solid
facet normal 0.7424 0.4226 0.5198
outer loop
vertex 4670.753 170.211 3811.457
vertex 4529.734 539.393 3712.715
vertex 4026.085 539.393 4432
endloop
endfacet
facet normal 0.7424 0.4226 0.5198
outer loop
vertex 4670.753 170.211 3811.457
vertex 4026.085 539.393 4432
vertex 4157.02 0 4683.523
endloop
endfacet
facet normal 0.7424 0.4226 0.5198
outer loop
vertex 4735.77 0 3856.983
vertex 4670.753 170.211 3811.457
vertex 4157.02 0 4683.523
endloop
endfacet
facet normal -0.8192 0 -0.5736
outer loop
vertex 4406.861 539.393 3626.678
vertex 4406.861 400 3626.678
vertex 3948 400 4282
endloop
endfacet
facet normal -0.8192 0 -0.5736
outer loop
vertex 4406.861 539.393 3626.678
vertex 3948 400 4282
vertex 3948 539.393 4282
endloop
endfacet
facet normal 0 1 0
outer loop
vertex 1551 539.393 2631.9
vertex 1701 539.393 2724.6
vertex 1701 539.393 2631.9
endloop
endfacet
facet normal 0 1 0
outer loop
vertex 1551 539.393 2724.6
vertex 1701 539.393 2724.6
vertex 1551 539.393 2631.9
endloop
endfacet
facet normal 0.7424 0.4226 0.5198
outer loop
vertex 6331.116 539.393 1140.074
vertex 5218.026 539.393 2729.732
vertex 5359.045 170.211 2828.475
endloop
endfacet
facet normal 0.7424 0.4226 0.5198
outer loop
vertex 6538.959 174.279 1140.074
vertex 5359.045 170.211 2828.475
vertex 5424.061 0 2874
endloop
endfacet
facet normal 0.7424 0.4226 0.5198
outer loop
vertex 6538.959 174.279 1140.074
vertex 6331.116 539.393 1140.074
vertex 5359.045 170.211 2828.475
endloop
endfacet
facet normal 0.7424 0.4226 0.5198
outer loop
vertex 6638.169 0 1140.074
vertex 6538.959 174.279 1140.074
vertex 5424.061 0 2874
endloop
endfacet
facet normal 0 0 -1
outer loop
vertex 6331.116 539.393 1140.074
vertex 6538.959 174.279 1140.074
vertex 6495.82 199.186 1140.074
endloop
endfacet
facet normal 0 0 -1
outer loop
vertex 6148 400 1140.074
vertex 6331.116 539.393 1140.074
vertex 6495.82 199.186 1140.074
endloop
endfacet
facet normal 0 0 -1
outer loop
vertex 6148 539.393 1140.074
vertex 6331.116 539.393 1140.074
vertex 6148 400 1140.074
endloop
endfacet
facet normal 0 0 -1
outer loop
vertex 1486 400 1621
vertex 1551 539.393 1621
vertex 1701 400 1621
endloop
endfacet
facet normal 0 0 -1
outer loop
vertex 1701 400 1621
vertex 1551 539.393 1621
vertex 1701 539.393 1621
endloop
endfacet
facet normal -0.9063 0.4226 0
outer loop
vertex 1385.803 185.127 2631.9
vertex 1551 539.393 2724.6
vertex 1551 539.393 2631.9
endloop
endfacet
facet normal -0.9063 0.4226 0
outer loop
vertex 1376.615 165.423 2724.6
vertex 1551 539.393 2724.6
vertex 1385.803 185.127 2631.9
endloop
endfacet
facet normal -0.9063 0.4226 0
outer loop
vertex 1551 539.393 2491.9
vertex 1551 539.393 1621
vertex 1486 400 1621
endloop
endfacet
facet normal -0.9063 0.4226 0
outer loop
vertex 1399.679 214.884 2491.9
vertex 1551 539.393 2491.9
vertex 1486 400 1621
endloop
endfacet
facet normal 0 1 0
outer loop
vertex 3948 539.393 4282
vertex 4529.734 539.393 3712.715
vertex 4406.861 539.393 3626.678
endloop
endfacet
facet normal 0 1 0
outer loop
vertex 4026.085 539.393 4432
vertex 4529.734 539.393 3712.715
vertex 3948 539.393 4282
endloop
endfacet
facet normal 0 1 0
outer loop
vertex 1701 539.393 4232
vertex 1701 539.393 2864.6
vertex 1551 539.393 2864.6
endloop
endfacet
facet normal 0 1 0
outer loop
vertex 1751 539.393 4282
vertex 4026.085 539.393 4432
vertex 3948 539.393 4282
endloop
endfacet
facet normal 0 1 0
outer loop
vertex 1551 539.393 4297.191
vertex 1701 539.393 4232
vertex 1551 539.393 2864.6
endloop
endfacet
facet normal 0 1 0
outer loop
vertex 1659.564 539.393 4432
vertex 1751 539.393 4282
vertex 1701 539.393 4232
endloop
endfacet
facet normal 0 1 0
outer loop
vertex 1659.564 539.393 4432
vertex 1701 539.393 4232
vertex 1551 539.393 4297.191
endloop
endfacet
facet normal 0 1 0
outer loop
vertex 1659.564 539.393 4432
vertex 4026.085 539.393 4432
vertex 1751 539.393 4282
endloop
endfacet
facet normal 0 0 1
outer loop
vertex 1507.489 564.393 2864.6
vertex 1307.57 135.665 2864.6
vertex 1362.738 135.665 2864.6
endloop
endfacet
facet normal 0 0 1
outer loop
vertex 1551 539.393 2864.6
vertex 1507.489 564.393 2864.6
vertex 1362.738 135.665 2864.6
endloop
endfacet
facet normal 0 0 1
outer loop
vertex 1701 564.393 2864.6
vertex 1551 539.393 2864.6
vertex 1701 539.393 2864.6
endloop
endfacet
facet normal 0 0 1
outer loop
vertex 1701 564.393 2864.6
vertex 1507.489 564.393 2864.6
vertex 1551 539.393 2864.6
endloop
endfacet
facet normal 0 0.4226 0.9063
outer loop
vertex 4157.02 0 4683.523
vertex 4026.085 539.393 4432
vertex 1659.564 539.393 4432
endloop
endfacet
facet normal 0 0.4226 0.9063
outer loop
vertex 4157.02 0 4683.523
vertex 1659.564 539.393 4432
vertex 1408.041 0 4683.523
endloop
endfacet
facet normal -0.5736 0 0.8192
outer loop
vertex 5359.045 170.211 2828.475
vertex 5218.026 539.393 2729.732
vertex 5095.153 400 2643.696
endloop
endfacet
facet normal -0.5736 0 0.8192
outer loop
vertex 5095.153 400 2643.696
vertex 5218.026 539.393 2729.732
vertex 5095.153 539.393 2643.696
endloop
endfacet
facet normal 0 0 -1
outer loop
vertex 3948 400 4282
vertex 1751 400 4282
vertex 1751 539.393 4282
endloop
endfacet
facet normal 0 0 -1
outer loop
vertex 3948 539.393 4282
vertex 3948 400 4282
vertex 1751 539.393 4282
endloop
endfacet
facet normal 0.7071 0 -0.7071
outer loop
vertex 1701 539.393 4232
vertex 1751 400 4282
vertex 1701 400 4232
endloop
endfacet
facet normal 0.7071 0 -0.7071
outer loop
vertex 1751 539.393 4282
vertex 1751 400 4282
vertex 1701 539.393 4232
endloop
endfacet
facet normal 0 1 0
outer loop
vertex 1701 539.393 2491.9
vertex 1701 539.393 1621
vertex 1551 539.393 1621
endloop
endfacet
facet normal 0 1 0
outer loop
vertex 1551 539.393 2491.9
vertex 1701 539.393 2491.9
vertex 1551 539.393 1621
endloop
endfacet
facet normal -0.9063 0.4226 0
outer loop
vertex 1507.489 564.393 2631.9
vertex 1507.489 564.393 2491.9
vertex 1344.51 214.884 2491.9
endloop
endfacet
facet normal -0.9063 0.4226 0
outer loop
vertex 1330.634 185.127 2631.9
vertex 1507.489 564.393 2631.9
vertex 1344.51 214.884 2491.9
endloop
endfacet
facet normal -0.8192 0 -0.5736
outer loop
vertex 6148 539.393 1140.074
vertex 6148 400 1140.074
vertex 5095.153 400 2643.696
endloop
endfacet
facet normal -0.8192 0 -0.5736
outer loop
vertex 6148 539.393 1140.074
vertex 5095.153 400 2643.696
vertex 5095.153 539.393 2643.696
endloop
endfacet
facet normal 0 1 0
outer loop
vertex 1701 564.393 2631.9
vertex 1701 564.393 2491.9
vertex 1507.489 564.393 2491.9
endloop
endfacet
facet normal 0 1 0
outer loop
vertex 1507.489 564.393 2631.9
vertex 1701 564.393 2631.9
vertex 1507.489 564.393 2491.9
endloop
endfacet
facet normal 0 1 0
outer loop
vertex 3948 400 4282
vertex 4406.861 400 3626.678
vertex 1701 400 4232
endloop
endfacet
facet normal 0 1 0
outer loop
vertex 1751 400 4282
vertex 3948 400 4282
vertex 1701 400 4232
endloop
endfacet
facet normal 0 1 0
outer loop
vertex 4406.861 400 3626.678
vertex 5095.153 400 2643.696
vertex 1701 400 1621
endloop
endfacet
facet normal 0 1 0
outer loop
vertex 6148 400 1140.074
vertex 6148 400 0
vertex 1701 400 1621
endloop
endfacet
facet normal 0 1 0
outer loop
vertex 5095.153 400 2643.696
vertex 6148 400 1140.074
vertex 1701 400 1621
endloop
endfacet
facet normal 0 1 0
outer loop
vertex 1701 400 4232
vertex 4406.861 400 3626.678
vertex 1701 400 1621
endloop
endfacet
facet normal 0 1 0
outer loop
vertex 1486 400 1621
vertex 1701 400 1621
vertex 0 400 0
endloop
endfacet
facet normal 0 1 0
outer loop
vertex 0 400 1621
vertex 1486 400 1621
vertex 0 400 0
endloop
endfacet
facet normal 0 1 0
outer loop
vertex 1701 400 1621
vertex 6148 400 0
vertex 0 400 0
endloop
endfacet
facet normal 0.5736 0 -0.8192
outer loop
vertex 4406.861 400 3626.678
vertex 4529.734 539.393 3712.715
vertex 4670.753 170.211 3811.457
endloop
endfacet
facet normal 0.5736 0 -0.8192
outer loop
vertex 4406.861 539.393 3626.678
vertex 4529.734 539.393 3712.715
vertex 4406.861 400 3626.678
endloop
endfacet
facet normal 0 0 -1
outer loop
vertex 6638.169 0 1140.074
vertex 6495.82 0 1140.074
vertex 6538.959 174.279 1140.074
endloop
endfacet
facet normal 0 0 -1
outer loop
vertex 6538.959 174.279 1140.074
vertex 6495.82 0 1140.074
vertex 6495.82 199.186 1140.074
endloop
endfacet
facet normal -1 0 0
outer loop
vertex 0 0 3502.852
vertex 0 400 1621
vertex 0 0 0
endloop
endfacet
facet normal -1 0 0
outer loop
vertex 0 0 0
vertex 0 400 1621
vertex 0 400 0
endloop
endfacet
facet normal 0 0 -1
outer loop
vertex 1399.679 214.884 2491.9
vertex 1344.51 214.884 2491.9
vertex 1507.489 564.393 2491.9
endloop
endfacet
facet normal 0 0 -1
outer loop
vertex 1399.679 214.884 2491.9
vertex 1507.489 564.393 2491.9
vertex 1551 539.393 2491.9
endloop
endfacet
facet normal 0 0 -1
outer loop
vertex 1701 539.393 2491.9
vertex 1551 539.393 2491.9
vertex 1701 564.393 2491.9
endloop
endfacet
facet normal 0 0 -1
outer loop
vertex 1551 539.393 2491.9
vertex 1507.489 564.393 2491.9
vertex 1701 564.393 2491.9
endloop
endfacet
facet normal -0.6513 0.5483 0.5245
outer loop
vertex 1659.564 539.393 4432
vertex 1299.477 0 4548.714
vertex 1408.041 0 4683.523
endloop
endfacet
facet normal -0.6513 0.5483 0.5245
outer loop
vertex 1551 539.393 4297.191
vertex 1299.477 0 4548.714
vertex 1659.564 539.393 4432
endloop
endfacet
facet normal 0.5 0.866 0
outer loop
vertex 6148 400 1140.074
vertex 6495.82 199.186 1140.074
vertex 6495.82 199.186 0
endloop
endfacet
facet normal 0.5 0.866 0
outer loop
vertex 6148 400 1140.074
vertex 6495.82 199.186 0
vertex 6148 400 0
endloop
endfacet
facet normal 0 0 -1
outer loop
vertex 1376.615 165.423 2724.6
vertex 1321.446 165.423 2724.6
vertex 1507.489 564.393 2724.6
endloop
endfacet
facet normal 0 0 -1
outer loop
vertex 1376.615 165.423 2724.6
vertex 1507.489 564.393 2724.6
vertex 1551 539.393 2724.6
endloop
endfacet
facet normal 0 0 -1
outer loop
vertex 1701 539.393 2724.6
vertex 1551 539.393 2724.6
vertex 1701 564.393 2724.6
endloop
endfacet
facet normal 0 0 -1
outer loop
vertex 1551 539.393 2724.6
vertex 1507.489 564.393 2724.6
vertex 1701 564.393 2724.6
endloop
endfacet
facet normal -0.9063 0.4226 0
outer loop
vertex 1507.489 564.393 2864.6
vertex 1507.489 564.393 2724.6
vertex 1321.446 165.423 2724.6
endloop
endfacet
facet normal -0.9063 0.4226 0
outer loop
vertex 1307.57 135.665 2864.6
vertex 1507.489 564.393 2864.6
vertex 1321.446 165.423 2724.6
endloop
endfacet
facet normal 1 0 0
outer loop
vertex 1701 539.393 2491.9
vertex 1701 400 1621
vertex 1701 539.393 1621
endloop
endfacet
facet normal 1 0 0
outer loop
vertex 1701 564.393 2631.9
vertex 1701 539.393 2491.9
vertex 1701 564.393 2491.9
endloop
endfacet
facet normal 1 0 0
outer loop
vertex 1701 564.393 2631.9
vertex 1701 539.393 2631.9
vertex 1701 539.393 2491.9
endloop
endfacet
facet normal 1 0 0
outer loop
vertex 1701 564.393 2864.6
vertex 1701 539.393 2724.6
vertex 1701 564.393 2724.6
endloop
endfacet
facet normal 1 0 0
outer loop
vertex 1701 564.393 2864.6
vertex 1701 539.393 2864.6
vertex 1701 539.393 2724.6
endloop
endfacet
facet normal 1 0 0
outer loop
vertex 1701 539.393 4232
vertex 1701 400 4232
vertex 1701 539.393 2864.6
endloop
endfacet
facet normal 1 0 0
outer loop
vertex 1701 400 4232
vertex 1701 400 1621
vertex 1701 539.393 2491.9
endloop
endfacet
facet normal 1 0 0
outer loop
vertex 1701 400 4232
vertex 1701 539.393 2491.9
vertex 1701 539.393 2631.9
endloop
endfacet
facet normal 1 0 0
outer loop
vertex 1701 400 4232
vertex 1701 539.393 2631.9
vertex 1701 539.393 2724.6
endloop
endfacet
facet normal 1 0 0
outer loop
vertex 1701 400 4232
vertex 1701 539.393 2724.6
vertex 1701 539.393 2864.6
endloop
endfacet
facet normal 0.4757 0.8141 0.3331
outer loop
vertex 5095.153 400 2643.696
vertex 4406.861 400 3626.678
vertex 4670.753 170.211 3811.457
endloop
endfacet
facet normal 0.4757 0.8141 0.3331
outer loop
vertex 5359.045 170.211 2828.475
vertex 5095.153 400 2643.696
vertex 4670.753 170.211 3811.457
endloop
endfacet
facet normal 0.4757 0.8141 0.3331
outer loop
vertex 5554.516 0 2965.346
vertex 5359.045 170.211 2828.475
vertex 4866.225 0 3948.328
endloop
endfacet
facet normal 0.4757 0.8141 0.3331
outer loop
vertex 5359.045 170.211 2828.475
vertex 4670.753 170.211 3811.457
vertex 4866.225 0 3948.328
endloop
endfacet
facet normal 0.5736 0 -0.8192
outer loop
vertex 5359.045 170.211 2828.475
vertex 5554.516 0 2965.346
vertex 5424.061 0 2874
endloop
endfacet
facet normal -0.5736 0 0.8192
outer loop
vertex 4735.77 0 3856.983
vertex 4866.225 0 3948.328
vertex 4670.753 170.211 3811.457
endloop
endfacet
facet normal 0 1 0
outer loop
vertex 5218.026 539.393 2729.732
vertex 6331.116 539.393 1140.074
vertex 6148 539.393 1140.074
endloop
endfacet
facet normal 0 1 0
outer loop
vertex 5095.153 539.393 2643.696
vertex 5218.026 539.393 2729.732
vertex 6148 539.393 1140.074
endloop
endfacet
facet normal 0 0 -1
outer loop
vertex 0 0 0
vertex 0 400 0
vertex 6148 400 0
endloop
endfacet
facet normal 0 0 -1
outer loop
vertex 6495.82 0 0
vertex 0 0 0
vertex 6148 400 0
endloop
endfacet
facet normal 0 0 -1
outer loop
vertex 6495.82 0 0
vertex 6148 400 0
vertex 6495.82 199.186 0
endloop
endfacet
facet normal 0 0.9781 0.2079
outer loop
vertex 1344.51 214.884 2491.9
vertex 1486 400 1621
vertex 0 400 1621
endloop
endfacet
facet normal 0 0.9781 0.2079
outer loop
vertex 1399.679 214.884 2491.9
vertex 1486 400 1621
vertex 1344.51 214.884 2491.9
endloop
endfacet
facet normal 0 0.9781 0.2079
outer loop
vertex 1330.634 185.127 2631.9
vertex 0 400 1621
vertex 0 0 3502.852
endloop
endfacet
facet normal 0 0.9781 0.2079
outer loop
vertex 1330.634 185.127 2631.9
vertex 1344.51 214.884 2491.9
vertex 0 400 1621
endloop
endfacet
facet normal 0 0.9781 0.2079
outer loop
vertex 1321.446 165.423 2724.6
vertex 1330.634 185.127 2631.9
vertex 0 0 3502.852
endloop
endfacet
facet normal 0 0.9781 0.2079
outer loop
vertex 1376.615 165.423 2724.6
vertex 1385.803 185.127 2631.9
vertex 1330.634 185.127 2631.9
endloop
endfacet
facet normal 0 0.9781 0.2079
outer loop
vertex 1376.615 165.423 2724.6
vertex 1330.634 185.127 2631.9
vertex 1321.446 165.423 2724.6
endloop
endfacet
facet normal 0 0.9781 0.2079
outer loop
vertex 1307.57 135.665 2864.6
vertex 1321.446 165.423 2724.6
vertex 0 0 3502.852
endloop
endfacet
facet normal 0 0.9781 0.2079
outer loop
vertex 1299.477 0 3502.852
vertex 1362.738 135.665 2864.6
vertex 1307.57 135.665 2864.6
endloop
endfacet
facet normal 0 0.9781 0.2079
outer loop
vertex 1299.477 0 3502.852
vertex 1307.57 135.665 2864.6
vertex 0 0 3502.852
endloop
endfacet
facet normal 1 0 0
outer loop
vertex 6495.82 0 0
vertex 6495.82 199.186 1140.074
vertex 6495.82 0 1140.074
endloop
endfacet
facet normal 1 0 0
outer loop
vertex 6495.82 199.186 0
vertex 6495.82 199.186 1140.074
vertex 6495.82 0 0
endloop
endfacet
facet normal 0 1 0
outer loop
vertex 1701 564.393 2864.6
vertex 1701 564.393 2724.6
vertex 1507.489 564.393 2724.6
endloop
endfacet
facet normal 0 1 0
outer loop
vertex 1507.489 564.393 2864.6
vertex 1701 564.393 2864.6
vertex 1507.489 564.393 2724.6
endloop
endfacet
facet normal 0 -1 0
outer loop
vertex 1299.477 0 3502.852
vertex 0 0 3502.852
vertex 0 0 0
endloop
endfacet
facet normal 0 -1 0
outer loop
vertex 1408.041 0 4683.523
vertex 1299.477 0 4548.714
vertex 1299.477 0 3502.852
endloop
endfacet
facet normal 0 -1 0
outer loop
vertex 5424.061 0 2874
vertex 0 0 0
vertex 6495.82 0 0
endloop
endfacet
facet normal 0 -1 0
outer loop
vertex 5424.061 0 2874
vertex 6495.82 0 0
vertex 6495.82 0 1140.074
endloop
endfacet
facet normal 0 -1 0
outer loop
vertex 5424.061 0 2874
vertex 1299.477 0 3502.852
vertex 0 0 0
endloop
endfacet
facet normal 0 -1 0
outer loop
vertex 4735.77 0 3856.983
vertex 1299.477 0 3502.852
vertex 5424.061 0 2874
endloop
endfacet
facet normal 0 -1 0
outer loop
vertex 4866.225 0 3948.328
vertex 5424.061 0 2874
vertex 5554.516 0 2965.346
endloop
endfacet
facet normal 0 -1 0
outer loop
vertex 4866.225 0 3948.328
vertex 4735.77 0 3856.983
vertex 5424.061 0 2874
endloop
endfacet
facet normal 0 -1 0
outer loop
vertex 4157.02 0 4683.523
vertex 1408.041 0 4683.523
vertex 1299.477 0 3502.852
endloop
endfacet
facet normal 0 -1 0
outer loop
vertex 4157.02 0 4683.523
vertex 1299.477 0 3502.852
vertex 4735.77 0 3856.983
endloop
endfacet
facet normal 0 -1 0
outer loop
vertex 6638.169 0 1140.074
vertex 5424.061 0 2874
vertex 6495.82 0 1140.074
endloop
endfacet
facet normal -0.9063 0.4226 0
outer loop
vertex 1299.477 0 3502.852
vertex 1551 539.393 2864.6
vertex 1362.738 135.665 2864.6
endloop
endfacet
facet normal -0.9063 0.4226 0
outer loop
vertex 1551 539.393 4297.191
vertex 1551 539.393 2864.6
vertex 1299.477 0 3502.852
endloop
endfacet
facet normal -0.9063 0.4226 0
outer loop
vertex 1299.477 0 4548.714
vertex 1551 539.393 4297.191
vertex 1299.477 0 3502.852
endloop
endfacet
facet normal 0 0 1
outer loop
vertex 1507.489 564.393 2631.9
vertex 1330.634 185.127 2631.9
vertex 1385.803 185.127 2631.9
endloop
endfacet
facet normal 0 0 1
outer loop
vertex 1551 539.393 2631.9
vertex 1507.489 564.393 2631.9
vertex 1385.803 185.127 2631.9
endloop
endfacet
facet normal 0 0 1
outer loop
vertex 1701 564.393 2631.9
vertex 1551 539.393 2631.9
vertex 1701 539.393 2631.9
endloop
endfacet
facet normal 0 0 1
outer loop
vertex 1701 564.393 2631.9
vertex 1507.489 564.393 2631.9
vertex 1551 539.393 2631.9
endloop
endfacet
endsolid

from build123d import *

# Parameters (mm, degrees)
EXTRUDE_1_DEPTH        = 400
EXTRUDE_2_DEPTH        = 1701
EXTRUDE_3_DEPTH        = 1140.074385
CUT_EXTRUDE_1_DEPTH    = 1140.074385
CHAMFER_1_SIZE2        = 124.175097768
CHAMFER_1_SIZE         = 100
CHAMFER_2_SIZE         = 50
EXTRUDE_START          = -870.9
EXTRUDE_4_DEPTH        = 140
PATTERN_LINEAR_1_COUNT = 2
PATTERN_LINEAR_1_PITCH = 232.7
EXTRUDE_START_2        = -800
EXTRUDE_5_DEPTH        = 1200
CUT_EXTRUDE_START      = -800
CUT_EXTRUDE_2_DEPTH    = 1200
CUT_EXTRUDE_START_2    = 6495.820323
SKETCH_9_W             = 1140.074385167
SKETCH_9_H             = 400
CUT_EXTRUDE_3_DEPTH    = 345


with BuildPart() as part:
    # 草图1 → 凸台-拉伸1 (new body)
    with BuildSketch(Plane(origin=(0, 0, 0), x_dir=(1, 0, 0), z_dir=(0, 1, 0))):
        Polygon((0, 0), (6148, 0), (6148, -1140.074385167), (3948, -4282), (1701, -4282), (1701, -1621), (0, -1621), align=None)
    extrude(amount=EXTRUDE_1_DEPTH)

    # 草图2 → 凸台-拉伸2 (add)
    with BuildSketch(Plane.ZY.offset(-1701)):
        Polygon((1621, 400), (3502.852043791, 0), (1621, 0), align=None)
    extrude(amount=EXTRUDE_2_DEPTH)

    # 草图3 → 凸台-拉伸3 (add)
    with BuildSketch(Plane(origin=(0, 0, 0), x_dir=(-1, 0, 0), z_dir=(0, 0, -1))):
        Polygon((-6148, 400), (-6148, 0), (-6840.820323028, 0), align=None)
    extrude(amount=-EXTRUDE_3_DEPTH)

    # 扫描2: sweep along a path in 草图5
    with BuildLine(Plane(origin=(0, 400, 0), x_dir=(1, 0, 0), z_dir=(0, 1, 0))) as sweep_2_path:
        Line((1701, -1621), (1701, -4282))
        Line((1701, -4282), (3948, -4282))
        Line((3948, -4282), (6434.788218176, -730.498363023))
    # 草图4 → 扫描2 (sweep)
    with BuildSketch(Plane.XY.offset(3282)):
        Polygon((1701, 400), (1701, 539.392949833), (1551, 539.392949833), (1299.476936738, 0), (1701, 0), align=None)
    sweep(path=sweep_2_path.line, transition=Transition.RIGHT)

    # 草图6 → 切除-拉伸1 (cut)
    with BuildSketch(Plane(origin=(0, 0, 0), x_dir=(-1, 0, 0), z_dir=(0, 0, -1))):
        Polygon((-6148, 400), (-6148, 600), (-6840.820323028, 600), (-6840.820323028, 0), align=None)
    extrude(amount=-CUT_EXTRUDE_1_DEPTH, mode=Mode.SUBTRACT)

    # 倒角1
    chamfer_1_edges = [part.edges().sort_by_distance(p)[0] for p in [
        (1425.238468369, 269.696474917, 4557.761531631),
    ]]
    chamfer(chamfer_1_edges, length=CHAMFER_1_SIZE, length2=CHAMFER_1_SIZE2)

    # 倒角2
    chamfer_2_edges = [part.edges().sort_by_distance(p)[0] for p in [
        (1701, 469.696474917, 4282),
    ]]
    chamfer(chamfer_2_edges, length=CHAMFER_2_SIZE)

    # 草图7 → 凸台-拉伸4 (add)
    with BuildSketch(Plane(origin=(0, 0, 1621), x_dir=(-1, 0, 0), z_dir=(0, 0, -1)).offset(EXTRUDE_START)):
        Polygon((-1701, 0), (-1701, 564.392949833), (-1507.488795506, 564.392949833), (-1244.30804079, 0), align=None)
    extrude_4 = extrude(amount=-EXTRUDE_4_DEPTH)

    # 阵列(线性)1: 凸台-拉伸4 ×2
    with Locations(*[(0, 0, i * PATTERN_LINEAR_1_PITCH) for i in range(1, PATTERN_LINEAR_1_COUNT)]):
        add(extrude_4)

    # 草图8 → 凸台-拉伸5 (add)
    with BuildSketch(Plane(origin=(3948, 539.392949833, 4282), x_dir=(0.819152044, 0, 0.573576436), z_dir=(-0.573576436, 0, 0.819152044)).offset(EXTRUDE_START_2)):
        Polygon((0, -539.392949833), (0, -139.392949833), (560.779317791, -539.392949833), align=None)
    extrude(amount=-EXTRUDE_5_DEPTH)

    # 草图8<3> → 切除-拉伸2 (cut)
    with BuildSketch(Plane(origin=(3948, 539.392949833, 4282), x_dir=(0.819152044, 0, 0.573576436), z_dir=(-0.573576436, 0, 0.819152044)).offset(CUT_EXTRUDE_START)):
        Polygon((0, 260.607050167), (560.779317791, -539.392949833), (0, -139.392949833), align=None)
    extrude(amount=-CUT_EXTRUDE_2_DEPTH, mode=Mode.SUBTRACT)

    # 草图9 → 切除-拉伸3 (cut)
    with BuildSketch(Plane(origin=(0, 0, 0), x_dir=(0, 0, -1), z_dir=(1, 0, 0)).offset(CUT_EXTRUDE_START_2)):
        with Locations((-570.037192584, 200)):
            Rectangle(SKETCH_9_W, SKETCH_9_H)
    extrude(amount=CUT_EXTRUDE_3_DEPTH, mode=Mode.SUBTRACT)


solid = part.part
